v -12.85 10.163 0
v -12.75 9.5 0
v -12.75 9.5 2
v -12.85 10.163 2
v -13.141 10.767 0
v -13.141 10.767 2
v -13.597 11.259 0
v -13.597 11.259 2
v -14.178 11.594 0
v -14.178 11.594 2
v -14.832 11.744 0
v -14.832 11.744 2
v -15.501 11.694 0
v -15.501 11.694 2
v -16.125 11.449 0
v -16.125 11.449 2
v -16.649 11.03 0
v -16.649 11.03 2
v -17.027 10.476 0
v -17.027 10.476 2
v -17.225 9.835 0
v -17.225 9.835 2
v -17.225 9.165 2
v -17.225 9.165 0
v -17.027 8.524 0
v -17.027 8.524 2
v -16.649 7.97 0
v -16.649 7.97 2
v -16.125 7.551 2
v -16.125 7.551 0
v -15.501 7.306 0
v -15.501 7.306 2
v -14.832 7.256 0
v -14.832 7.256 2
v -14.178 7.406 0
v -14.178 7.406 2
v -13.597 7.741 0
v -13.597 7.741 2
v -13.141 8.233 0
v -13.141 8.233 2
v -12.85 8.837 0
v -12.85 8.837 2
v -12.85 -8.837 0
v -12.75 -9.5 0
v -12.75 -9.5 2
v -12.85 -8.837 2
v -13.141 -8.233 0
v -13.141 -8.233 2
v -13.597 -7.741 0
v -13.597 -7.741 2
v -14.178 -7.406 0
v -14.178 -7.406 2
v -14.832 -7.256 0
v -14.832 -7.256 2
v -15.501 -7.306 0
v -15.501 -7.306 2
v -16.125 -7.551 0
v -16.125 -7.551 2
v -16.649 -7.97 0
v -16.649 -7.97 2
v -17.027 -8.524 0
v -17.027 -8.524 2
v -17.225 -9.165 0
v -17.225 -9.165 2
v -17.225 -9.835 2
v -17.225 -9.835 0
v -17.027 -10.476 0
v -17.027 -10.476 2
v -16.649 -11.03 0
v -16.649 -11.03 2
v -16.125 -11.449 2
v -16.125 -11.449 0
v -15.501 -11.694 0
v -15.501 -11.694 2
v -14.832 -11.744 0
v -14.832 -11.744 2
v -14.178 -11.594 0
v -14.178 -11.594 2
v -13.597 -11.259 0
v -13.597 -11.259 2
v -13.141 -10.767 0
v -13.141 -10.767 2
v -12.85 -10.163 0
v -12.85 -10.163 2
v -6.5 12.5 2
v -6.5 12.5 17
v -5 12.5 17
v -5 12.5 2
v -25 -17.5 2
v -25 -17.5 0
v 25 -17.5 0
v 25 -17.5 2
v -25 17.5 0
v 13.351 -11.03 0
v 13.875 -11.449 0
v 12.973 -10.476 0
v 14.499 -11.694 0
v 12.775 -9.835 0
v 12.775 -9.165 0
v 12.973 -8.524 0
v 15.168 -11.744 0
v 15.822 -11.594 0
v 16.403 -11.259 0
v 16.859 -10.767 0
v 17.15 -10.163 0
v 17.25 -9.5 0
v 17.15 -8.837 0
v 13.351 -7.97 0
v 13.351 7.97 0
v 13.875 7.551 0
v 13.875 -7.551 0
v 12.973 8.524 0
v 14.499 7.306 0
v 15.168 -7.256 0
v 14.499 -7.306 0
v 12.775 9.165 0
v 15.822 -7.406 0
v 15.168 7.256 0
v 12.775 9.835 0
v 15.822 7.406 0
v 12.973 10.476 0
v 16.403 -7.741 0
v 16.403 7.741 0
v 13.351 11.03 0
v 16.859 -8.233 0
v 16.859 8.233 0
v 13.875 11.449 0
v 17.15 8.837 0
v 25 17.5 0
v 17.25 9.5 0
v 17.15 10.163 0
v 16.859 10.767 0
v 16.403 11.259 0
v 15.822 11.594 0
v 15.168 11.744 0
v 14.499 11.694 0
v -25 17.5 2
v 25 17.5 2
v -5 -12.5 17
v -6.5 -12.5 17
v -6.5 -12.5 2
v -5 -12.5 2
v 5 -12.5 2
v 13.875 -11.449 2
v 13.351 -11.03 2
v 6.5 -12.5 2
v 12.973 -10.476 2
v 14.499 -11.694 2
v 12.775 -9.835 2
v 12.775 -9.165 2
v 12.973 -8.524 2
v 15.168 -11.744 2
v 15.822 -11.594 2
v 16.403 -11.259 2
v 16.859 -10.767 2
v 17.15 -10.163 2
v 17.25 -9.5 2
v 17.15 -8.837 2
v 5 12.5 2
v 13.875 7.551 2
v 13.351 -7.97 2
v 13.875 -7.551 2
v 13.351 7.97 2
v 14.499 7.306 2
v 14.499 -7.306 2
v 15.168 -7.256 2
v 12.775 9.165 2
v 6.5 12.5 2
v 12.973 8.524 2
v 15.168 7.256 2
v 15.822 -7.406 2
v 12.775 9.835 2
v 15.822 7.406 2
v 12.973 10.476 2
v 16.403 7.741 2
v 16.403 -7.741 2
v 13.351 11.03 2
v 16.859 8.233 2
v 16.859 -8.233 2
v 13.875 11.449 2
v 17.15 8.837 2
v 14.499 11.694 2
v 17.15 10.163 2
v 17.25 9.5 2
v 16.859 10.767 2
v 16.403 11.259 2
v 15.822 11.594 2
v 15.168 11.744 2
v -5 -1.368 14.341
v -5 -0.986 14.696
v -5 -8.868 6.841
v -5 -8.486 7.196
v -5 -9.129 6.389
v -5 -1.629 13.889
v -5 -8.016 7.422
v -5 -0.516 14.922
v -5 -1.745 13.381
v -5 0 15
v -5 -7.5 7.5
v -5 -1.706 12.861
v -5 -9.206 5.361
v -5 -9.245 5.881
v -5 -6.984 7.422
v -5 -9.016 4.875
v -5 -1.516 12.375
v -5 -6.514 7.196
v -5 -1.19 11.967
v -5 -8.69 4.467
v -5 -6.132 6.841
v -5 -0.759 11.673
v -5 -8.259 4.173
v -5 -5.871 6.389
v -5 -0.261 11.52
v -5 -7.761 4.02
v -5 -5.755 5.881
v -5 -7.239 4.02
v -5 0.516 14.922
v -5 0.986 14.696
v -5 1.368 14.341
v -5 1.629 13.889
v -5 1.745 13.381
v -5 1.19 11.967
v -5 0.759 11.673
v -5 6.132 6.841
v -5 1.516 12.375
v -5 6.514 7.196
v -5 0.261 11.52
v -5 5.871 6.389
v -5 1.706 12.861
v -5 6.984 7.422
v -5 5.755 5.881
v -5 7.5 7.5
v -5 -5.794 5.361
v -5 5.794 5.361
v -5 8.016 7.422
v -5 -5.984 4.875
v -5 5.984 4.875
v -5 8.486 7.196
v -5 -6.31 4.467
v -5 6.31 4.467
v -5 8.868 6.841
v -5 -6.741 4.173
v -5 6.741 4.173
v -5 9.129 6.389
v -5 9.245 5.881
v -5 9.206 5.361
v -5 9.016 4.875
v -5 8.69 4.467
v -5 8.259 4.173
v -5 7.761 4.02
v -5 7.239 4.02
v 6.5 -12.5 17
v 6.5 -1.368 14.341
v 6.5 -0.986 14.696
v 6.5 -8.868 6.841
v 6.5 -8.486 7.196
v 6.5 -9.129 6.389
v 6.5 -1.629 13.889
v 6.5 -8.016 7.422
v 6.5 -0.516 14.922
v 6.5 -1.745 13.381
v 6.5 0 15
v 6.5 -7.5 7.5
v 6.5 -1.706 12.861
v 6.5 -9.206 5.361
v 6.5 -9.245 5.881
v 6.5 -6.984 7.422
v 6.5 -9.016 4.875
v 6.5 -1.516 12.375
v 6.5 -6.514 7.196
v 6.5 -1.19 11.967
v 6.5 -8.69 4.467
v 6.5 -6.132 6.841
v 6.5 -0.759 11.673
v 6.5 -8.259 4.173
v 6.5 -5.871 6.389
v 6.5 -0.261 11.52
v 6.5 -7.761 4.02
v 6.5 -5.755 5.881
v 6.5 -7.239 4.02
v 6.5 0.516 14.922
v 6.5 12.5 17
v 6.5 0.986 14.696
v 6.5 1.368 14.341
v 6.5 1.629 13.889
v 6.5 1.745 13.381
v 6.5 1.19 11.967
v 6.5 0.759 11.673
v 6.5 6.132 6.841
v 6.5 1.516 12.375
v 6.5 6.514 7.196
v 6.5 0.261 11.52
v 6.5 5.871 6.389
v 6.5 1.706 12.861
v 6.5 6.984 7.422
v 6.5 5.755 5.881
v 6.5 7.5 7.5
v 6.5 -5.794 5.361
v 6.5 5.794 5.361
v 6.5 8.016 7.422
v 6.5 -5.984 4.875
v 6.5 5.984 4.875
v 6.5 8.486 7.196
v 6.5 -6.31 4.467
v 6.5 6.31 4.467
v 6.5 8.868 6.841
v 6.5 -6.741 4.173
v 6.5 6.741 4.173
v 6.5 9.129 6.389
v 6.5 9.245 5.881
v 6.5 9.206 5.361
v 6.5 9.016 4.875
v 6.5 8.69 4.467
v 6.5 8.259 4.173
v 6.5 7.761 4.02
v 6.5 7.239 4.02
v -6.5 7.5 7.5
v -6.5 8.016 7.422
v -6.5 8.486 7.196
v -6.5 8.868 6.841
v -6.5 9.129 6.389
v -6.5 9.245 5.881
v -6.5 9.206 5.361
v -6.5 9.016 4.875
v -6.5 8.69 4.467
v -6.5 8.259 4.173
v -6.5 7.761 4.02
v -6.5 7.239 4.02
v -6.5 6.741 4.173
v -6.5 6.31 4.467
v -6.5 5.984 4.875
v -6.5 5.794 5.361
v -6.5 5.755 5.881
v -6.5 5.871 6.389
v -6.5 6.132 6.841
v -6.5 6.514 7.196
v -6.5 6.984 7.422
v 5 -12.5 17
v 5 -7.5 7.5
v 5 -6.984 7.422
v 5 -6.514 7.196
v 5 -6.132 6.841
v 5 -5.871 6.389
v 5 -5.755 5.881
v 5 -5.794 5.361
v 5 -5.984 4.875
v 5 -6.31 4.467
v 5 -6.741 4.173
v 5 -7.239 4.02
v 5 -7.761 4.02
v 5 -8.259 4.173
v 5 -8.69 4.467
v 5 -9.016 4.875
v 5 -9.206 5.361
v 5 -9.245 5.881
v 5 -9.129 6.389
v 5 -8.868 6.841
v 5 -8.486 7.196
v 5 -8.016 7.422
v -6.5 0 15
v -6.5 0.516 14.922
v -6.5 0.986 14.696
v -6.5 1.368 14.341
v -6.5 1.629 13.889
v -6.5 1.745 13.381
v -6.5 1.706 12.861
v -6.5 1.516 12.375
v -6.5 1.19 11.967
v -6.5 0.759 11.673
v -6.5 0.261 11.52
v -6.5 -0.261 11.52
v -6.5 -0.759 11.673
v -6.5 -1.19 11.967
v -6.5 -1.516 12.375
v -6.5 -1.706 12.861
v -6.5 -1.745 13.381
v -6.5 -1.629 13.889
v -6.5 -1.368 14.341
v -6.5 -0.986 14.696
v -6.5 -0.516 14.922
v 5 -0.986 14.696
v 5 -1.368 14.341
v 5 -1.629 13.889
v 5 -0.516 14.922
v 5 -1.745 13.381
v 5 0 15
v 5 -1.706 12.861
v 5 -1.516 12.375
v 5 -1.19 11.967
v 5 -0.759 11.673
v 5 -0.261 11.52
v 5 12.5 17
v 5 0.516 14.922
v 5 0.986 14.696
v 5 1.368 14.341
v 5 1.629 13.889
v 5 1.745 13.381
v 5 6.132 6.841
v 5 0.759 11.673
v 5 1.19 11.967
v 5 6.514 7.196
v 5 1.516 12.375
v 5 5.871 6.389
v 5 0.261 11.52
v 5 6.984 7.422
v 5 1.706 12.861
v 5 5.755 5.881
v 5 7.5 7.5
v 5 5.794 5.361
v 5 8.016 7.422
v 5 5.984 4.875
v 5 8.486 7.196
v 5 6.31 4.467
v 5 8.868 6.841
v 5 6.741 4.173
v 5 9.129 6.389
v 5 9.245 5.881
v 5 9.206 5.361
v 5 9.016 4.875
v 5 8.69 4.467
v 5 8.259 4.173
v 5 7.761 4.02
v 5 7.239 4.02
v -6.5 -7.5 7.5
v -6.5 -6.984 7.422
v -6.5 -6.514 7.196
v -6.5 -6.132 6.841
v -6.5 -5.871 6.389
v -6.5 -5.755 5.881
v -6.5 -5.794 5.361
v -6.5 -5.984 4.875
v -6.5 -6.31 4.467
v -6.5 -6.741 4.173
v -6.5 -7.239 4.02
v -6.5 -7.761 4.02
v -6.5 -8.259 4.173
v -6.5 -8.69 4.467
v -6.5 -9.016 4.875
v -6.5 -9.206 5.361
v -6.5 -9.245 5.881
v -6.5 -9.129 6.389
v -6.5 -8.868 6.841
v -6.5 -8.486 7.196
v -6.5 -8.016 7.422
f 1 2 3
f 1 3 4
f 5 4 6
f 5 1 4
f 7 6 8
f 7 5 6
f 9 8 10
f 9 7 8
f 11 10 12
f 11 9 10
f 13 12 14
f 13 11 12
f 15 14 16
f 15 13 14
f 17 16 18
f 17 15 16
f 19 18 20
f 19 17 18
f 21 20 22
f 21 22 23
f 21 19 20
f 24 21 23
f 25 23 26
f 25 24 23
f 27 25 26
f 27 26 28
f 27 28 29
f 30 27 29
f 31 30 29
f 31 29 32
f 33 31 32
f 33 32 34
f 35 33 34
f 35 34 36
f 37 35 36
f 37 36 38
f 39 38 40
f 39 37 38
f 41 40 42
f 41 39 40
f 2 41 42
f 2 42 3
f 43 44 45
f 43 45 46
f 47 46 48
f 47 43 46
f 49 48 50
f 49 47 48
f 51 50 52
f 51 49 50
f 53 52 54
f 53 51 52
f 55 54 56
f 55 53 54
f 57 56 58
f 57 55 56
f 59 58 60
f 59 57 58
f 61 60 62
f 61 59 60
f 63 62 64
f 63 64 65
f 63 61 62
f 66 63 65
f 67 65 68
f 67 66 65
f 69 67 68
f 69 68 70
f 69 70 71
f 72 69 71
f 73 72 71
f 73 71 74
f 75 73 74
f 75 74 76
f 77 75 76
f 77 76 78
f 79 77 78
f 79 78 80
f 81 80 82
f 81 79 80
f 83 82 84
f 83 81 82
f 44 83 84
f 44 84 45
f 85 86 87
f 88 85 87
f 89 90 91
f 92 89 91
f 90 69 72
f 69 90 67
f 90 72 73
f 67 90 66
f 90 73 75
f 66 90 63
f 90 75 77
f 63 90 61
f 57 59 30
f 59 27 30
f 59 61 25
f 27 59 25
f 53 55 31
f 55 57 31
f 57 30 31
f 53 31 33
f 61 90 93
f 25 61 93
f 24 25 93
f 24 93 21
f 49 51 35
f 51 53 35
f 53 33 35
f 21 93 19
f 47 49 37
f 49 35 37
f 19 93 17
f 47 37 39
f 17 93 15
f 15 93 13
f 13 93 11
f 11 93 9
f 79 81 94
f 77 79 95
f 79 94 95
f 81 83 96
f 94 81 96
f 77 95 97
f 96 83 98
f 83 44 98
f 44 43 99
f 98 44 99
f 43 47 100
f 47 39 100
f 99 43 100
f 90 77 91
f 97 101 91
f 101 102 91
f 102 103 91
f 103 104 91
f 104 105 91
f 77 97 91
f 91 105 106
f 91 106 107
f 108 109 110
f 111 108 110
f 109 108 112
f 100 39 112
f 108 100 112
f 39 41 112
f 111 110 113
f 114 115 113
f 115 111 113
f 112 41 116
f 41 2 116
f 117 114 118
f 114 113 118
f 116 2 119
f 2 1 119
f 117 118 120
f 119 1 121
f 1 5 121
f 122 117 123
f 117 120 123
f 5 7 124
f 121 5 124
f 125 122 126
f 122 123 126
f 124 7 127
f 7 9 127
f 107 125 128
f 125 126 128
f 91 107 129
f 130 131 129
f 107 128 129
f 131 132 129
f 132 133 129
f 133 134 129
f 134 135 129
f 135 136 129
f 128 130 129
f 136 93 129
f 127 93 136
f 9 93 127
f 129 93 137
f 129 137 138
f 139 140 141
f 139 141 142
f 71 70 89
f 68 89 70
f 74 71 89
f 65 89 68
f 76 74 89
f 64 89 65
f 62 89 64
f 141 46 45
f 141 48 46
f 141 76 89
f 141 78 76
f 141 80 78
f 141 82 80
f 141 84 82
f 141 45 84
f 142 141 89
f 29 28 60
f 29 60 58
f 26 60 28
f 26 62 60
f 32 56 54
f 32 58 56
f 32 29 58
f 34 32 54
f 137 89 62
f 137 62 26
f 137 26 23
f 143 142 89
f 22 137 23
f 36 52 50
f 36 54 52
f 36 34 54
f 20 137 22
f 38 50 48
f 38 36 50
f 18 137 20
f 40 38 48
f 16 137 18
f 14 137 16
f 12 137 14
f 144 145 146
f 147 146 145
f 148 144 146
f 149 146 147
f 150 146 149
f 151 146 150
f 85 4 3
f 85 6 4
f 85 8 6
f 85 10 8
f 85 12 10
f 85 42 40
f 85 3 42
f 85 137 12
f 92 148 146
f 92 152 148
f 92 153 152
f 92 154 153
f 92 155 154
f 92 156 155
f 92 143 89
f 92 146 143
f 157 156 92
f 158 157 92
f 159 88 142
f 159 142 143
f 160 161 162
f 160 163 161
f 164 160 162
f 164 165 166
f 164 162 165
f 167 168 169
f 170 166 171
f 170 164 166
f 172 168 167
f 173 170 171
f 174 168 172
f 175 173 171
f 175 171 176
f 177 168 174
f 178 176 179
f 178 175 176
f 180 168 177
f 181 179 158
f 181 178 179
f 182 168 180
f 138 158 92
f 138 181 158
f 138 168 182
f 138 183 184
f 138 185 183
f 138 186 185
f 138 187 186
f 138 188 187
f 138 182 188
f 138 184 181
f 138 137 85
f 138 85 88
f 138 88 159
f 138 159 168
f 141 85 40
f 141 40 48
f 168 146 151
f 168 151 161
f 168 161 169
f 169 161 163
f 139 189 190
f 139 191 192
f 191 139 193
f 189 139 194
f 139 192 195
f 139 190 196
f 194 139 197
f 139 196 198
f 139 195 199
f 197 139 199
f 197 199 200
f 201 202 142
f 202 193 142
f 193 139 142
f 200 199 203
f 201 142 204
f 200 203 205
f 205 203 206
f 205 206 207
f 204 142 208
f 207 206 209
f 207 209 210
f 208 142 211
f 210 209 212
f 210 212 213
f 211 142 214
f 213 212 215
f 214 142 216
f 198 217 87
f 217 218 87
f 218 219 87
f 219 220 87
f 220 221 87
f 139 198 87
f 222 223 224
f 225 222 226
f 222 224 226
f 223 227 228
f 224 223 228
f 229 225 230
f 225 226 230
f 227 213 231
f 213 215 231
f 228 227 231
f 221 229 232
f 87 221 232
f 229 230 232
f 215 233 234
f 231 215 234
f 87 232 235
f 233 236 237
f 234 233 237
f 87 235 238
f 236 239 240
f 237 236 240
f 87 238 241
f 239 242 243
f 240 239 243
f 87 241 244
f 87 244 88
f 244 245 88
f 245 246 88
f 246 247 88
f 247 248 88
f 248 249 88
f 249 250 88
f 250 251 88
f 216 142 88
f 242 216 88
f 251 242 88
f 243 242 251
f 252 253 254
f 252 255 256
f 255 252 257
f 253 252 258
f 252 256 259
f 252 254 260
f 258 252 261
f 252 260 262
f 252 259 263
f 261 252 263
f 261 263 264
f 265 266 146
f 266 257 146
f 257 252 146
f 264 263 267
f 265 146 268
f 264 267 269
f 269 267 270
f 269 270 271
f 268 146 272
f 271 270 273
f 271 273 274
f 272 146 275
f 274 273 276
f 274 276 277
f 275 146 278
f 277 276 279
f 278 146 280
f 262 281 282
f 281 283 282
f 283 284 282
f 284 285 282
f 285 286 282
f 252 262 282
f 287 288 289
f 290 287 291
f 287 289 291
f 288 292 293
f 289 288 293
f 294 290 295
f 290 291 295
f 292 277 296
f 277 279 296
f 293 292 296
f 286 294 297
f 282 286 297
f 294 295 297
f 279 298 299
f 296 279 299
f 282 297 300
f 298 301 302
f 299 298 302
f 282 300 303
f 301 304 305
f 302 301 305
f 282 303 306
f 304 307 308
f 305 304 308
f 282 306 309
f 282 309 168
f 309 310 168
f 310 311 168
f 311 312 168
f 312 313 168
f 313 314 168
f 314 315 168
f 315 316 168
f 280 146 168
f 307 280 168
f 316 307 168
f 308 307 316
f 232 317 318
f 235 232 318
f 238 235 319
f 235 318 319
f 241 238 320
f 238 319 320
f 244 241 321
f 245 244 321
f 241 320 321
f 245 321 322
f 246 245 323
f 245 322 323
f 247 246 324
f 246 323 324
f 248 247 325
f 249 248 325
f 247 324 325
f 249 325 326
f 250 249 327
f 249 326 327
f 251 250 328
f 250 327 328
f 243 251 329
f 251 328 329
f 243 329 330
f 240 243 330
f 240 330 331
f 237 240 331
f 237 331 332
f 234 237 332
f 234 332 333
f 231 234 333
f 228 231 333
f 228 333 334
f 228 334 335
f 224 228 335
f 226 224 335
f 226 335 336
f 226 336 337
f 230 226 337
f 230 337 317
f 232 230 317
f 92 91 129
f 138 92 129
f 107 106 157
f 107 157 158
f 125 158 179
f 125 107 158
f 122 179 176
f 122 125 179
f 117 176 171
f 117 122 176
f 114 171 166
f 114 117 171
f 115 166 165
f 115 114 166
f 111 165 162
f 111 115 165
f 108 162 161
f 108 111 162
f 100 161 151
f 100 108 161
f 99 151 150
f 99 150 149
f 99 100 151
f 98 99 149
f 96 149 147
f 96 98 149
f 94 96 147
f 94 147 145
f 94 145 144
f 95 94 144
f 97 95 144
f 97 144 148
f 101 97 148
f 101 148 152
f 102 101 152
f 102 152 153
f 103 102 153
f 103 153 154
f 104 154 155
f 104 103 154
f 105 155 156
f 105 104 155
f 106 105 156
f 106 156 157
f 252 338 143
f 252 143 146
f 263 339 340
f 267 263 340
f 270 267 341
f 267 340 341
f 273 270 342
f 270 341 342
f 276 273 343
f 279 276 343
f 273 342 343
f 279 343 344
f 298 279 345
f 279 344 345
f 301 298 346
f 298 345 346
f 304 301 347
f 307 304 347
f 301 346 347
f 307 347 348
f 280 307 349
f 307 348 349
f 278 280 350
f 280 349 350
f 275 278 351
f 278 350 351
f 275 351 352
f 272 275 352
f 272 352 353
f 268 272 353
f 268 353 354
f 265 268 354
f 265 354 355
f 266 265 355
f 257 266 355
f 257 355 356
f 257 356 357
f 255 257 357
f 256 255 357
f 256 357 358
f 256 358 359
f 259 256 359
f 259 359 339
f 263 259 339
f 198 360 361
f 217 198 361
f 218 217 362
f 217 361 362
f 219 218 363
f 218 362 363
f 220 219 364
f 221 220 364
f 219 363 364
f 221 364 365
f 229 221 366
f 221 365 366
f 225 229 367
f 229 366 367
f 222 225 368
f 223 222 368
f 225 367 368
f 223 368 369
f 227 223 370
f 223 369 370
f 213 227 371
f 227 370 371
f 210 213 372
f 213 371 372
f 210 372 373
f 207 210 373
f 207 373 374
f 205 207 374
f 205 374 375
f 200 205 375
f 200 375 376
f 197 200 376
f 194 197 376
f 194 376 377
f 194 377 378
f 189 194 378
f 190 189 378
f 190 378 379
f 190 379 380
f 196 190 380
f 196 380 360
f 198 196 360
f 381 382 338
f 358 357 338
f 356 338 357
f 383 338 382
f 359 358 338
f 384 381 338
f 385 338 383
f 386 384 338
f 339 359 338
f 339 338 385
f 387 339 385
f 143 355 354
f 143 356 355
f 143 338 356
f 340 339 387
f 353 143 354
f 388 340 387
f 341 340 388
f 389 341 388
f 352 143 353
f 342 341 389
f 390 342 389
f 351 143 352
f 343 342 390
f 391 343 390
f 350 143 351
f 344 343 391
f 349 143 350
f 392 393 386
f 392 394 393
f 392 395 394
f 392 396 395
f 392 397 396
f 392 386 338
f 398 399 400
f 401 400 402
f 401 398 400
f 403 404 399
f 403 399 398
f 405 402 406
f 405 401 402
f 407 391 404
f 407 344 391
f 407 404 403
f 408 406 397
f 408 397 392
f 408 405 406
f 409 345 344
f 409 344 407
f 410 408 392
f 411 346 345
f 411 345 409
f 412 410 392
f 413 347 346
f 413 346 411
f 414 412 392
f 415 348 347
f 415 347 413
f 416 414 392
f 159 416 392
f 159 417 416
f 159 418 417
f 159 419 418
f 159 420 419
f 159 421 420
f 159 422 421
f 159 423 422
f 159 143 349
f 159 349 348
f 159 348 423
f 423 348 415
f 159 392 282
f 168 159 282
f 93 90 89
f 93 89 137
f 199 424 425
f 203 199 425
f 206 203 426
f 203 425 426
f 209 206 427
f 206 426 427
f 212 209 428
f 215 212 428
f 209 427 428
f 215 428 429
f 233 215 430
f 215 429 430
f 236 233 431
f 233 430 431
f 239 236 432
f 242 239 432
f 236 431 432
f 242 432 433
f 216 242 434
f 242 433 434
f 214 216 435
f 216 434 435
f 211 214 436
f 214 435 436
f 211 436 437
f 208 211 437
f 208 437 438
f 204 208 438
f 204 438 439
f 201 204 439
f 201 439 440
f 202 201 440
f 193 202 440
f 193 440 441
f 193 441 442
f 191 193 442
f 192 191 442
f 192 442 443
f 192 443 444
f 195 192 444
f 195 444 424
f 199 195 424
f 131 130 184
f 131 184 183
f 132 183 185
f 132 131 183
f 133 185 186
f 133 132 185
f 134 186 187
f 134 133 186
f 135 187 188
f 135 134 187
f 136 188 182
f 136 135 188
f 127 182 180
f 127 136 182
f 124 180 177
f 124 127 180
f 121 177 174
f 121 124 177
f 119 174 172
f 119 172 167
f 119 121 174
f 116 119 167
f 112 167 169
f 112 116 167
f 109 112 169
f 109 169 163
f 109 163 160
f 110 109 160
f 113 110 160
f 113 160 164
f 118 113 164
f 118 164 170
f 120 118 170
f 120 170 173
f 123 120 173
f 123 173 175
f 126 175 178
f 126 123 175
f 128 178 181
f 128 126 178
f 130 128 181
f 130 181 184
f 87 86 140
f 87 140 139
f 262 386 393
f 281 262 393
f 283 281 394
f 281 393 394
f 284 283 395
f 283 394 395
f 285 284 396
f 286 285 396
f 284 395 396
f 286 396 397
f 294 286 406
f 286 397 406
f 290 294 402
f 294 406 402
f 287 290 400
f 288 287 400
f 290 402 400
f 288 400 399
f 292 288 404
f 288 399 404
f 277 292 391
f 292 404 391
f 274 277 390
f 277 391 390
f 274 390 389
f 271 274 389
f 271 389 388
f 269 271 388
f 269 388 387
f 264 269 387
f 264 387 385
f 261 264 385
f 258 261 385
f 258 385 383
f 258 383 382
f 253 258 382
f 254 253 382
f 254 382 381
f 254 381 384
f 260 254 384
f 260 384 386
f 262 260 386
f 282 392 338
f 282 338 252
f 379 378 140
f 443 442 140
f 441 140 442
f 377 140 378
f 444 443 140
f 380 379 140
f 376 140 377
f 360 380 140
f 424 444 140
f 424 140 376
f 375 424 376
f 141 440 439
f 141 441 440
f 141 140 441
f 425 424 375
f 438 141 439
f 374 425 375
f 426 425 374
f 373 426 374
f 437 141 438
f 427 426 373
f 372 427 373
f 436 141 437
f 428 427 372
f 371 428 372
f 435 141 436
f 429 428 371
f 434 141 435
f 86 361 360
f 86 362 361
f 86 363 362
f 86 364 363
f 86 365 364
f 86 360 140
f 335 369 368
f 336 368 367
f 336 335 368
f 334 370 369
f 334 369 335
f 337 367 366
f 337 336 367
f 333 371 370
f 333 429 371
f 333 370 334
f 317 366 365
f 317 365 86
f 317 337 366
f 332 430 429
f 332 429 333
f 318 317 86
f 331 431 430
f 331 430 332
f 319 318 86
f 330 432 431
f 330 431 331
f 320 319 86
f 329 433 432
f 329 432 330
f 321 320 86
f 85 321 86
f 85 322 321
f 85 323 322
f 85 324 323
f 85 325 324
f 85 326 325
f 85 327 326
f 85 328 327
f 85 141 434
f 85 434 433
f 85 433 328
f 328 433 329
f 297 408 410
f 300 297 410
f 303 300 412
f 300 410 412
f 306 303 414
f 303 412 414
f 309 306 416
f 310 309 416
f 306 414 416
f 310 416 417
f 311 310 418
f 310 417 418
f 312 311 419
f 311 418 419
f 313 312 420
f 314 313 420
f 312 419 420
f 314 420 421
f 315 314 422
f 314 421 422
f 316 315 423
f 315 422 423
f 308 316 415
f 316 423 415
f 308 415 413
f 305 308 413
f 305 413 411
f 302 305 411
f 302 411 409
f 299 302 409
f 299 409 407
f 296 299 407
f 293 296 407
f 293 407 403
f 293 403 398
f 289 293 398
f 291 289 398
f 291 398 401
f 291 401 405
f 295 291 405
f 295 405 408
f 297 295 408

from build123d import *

# Parameters (mm, degrees)
SKETCH2_W           = 50
SKETCH2_H           = 35
SKETCH2_R           = 2.25
BOSS_EXTRUDE1_DEPTH = 2
SKETCH3_W           = 1.5
SKETCH3_H           = 25
BOSS_EXTRUDE2_DEPTH = 15
SKETCH4_R           = 1.75
CUT_EXTRUDE1_DEPTH  = 32.5


with BuildPart() as part:
    # Sketch2 → Boss-Extrude1 (new body)
    with BuildSketch(Plane.XY):
        Rectangle(SKETCH2_W, SKETCH2_H)
        with Locations((15, 9.5)):
            Circle(SKETCH2_R, mode=Mode.SUBTRACT)
        with Locations((-15, 9.5)):
            Circle(SKETCH2_R, mode=Mode.SUBTRACT)
        with Locations((-15, -9.5)):
            Circle(SKETCH2_R, mode=Mode.SUBTRACT)
        with Locations((15, -9.5)):
            Circle(SKETCH2_R, mode=Mode.SUBTRACT)
    extrude(amount=BOSS_EXTRUDE1_DEPTH)

    # Sketch3 → Boss-Extrude2 (add)
    with BuildSketch(Plane.XY.offset(2)):
        with Locations((-5.75, 0)):
            Rectangle(SKETCH3_W, SKETCH3_H)
        with Locations((5.75, 0)):
            Rectangle(SKETCH3_W, SKETCH3_H)
    extrude(amount=BOSS_EXTRUDE2_DEPTH)

    # Sketch4 → Cut-Extrude1 (cut, through all)
    with BuildSketch(Plane.ZY.offset(6.5)):
        with Locations((5.75, -7.5)):
            Circle(SKETCH4_R)
        with Locations((5.75, 7.5)):
            Circle(SKETCH4_R)
        with Locations((13.25, 0)):
            Circle(SKETCH4_R)
    extrude(amount=-CUT_EXTRUDE1_DEPTH, mode=Mode.SUBTRACT)


solid = part.part
